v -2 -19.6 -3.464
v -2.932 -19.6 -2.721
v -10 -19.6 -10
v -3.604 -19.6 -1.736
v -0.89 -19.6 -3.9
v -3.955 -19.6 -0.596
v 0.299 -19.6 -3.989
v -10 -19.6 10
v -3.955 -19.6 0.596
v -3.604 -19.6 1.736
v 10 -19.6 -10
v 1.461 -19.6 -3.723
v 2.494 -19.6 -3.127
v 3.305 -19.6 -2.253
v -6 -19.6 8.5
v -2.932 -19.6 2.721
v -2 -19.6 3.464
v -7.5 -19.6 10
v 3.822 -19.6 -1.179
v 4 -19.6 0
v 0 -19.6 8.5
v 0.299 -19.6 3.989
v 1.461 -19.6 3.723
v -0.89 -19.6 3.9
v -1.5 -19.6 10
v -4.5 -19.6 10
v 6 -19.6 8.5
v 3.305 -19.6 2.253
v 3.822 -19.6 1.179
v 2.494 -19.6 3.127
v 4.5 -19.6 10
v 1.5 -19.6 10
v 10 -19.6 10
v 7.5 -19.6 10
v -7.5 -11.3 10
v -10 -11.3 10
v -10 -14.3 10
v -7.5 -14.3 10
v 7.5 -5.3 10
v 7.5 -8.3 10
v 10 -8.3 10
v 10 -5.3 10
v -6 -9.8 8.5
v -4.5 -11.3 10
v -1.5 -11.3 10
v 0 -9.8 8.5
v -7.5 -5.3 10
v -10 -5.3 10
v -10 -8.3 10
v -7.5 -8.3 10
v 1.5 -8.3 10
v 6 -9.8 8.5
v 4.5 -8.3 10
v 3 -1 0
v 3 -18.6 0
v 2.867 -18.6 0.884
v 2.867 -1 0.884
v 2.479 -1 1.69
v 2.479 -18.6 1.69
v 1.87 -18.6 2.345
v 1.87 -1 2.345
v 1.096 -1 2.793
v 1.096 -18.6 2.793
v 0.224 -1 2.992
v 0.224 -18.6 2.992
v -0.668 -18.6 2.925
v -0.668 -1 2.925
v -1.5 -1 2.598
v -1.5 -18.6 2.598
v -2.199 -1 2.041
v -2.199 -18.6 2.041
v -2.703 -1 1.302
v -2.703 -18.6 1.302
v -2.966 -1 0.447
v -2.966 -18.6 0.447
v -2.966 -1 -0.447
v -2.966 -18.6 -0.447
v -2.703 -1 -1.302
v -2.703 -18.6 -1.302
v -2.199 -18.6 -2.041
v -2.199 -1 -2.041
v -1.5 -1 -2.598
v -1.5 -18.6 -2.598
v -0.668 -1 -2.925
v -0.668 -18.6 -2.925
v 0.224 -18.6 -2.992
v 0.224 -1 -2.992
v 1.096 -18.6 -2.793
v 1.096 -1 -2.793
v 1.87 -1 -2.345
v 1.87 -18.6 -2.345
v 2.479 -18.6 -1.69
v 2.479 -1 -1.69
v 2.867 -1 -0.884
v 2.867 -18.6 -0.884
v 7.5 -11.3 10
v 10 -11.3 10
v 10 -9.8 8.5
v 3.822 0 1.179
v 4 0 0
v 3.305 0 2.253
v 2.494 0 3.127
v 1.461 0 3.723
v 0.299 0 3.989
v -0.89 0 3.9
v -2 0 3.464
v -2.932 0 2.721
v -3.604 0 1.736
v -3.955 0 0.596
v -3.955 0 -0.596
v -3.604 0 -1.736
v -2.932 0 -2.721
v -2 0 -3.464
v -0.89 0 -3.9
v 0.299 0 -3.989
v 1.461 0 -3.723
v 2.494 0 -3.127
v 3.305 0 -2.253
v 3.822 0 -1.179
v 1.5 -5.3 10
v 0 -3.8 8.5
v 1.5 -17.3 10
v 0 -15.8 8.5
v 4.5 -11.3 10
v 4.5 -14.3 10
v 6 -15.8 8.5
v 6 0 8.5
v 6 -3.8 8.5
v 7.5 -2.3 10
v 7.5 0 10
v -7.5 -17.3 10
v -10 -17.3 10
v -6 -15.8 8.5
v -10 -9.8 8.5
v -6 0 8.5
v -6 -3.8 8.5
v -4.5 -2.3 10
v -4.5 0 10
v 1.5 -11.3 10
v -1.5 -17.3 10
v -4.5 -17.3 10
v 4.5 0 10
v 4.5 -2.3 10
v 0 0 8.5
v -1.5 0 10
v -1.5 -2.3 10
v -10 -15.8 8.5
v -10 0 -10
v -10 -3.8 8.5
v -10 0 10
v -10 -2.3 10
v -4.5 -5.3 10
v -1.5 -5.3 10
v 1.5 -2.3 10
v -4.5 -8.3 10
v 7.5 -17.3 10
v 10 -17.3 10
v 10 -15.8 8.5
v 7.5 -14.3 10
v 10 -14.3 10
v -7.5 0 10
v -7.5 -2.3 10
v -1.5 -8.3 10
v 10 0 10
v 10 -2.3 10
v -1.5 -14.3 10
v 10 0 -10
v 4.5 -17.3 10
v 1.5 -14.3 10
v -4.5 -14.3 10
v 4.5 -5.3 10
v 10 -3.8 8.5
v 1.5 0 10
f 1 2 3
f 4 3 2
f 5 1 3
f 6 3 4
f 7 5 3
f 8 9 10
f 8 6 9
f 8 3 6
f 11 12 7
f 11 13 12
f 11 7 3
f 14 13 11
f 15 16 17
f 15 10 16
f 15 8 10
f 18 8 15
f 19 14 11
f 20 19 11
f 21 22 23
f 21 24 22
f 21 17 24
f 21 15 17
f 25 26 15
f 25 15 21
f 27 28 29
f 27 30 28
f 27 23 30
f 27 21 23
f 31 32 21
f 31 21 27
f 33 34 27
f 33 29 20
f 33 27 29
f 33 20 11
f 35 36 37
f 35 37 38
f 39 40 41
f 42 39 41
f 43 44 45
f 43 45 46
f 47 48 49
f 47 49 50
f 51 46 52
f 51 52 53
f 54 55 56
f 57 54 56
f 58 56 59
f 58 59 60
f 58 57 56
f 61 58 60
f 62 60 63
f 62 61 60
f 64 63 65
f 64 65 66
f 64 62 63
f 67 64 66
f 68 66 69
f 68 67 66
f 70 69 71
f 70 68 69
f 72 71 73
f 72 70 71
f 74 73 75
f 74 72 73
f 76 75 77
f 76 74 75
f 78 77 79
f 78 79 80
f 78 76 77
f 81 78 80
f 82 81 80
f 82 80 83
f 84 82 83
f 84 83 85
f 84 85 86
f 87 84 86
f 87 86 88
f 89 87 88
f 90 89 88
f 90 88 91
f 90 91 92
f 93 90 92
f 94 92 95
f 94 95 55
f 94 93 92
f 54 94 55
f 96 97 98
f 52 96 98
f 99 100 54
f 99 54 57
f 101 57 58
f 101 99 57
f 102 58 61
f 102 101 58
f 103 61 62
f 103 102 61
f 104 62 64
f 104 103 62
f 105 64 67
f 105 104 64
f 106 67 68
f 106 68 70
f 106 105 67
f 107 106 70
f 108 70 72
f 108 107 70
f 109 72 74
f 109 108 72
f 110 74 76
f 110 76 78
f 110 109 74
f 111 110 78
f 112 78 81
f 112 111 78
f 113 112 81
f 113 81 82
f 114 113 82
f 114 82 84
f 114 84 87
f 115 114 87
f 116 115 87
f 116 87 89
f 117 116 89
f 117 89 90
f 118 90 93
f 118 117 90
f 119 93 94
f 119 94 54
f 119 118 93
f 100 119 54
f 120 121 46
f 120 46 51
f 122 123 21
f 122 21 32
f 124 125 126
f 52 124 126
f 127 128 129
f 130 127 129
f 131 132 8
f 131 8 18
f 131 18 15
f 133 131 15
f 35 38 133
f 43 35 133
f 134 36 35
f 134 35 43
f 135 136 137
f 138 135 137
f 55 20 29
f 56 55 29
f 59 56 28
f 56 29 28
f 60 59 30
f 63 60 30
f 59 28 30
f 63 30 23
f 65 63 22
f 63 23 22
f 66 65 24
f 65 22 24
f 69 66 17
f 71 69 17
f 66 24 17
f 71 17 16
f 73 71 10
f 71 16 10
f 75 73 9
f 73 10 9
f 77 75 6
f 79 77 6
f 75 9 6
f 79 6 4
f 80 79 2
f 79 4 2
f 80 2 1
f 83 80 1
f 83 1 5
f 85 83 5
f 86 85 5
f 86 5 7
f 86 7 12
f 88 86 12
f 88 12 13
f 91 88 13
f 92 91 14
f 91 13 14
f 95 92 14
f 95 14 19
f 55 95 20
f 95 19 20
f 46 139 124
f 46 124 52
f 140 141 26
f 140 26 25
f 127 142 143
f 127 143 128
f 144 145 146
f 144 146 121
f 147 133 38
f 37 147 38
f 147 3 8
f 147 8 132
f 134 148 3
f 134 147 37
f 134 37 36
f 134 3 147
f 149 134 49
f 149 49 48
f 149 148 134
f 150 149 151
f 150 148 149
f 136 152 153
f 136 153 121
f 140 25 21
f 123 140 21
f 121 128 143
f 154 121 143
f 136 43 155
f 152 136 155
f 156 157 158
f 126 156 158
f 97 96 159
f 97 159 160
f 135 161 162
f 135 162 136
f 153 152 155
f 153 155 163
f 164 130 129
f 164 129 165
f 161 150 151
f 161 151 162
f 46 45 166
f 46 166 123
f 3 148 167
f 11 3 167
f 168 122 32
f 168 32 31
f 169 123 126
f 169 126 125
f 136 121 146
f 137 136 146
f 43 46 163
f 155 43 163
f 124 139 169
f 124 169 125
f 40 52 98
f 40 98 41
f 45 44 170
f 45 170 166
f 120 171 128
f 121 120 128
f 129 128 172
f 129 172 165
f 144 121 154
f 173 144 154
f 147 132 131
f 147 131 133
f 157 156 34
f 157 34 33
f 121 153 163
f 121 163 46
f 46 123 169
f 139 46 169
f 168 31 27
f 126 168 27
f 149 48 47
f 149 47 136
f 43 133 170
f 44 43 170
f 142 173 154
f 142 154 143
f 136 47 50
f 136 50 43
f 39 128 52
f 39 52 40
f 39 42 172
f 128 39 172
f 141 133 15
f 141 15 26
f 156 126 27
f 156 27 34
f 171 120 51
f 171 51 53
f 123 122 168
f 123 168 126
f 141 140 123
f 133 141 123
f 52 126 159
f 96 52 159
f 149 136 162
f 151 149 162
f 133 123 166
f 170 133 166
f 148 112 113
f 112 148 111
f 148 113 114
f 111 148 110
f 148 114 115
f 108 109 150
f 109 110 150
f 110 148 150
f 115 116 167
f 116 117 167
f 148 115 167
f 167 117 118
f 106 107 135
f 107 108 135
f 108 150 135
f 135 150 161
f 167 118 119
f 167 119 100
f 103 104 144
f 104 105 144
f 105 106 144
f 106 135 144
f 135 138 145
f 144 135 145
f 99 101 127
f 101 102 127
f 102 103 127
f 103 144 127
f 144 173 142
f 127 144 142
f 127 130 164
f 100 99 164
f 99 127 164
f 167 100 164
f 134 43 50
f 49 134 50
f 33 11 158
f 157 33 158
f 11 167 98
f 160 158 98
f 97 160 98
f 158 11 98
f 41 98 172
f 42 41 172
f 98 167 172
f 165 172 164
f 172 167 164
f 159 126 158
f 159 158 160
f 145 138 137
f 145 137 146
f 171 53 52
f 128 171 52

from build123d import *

# Parameters (mm, degrees)
F0_W     = 20
F0_H     = 20
F0_R     = 3
F1_DEPTH = 19.6
F2_SIZE  = 1
F4_DEPTH = 19.601
F6_DEPTH = 20.001


with BuildPart() as f1:
    # F0 (on Front) → F1 (new body)
    with BuildSketch(Plane.XZ):
        Rectangle(F0_W, F0_H)
        Circle(F0_R, mode=Mode.SUBTRACT)
    extrude(amount=F1_DEPTH)

    # F2
    f2_edges = [f1.edges().sort_by_distance(p)[0] for p in [
        (-3, -19.6, 0),
        (-3, 0, 0),
    ]]
    chamfer(f2_edges, length=F2_SIZE)

    # F3 (on face) → F4 (cut, through all)
    with BuildSketch(Plane.XZ.offset(19.6)):
        Polygon((-4.5, 10), (-7.5, 10), (-6, 8.5), align=None)
        Polygon((1.5, 10), (-1.5, 10), (0, 8.5), align=None)
        Polygon((7.5, 10), (4.5, 10), (6, 8.5), align=None)
    extrude(amount=-F4_DEPTH, mode=Mode.SUBTRACT)

    # F5 (on face) → F6 (cut, through all)
    with BuildSketch(Plane.YZ.offset(10)):
        Polygon((-14.3, 10), (-17.3, 10), (-15.8, 8.5), align=None)
        Polygon((-8.3, 10), (-11.3, 10), (-9.8, 8.5), align=None)
        Polygon((-2.3, 10), (-5.3, 10), (-3.8, 8.5), align=None)
    extrude(amount=-F6_DEPTH, mode=Mode.SUBTRACT)


solid = f1.part
